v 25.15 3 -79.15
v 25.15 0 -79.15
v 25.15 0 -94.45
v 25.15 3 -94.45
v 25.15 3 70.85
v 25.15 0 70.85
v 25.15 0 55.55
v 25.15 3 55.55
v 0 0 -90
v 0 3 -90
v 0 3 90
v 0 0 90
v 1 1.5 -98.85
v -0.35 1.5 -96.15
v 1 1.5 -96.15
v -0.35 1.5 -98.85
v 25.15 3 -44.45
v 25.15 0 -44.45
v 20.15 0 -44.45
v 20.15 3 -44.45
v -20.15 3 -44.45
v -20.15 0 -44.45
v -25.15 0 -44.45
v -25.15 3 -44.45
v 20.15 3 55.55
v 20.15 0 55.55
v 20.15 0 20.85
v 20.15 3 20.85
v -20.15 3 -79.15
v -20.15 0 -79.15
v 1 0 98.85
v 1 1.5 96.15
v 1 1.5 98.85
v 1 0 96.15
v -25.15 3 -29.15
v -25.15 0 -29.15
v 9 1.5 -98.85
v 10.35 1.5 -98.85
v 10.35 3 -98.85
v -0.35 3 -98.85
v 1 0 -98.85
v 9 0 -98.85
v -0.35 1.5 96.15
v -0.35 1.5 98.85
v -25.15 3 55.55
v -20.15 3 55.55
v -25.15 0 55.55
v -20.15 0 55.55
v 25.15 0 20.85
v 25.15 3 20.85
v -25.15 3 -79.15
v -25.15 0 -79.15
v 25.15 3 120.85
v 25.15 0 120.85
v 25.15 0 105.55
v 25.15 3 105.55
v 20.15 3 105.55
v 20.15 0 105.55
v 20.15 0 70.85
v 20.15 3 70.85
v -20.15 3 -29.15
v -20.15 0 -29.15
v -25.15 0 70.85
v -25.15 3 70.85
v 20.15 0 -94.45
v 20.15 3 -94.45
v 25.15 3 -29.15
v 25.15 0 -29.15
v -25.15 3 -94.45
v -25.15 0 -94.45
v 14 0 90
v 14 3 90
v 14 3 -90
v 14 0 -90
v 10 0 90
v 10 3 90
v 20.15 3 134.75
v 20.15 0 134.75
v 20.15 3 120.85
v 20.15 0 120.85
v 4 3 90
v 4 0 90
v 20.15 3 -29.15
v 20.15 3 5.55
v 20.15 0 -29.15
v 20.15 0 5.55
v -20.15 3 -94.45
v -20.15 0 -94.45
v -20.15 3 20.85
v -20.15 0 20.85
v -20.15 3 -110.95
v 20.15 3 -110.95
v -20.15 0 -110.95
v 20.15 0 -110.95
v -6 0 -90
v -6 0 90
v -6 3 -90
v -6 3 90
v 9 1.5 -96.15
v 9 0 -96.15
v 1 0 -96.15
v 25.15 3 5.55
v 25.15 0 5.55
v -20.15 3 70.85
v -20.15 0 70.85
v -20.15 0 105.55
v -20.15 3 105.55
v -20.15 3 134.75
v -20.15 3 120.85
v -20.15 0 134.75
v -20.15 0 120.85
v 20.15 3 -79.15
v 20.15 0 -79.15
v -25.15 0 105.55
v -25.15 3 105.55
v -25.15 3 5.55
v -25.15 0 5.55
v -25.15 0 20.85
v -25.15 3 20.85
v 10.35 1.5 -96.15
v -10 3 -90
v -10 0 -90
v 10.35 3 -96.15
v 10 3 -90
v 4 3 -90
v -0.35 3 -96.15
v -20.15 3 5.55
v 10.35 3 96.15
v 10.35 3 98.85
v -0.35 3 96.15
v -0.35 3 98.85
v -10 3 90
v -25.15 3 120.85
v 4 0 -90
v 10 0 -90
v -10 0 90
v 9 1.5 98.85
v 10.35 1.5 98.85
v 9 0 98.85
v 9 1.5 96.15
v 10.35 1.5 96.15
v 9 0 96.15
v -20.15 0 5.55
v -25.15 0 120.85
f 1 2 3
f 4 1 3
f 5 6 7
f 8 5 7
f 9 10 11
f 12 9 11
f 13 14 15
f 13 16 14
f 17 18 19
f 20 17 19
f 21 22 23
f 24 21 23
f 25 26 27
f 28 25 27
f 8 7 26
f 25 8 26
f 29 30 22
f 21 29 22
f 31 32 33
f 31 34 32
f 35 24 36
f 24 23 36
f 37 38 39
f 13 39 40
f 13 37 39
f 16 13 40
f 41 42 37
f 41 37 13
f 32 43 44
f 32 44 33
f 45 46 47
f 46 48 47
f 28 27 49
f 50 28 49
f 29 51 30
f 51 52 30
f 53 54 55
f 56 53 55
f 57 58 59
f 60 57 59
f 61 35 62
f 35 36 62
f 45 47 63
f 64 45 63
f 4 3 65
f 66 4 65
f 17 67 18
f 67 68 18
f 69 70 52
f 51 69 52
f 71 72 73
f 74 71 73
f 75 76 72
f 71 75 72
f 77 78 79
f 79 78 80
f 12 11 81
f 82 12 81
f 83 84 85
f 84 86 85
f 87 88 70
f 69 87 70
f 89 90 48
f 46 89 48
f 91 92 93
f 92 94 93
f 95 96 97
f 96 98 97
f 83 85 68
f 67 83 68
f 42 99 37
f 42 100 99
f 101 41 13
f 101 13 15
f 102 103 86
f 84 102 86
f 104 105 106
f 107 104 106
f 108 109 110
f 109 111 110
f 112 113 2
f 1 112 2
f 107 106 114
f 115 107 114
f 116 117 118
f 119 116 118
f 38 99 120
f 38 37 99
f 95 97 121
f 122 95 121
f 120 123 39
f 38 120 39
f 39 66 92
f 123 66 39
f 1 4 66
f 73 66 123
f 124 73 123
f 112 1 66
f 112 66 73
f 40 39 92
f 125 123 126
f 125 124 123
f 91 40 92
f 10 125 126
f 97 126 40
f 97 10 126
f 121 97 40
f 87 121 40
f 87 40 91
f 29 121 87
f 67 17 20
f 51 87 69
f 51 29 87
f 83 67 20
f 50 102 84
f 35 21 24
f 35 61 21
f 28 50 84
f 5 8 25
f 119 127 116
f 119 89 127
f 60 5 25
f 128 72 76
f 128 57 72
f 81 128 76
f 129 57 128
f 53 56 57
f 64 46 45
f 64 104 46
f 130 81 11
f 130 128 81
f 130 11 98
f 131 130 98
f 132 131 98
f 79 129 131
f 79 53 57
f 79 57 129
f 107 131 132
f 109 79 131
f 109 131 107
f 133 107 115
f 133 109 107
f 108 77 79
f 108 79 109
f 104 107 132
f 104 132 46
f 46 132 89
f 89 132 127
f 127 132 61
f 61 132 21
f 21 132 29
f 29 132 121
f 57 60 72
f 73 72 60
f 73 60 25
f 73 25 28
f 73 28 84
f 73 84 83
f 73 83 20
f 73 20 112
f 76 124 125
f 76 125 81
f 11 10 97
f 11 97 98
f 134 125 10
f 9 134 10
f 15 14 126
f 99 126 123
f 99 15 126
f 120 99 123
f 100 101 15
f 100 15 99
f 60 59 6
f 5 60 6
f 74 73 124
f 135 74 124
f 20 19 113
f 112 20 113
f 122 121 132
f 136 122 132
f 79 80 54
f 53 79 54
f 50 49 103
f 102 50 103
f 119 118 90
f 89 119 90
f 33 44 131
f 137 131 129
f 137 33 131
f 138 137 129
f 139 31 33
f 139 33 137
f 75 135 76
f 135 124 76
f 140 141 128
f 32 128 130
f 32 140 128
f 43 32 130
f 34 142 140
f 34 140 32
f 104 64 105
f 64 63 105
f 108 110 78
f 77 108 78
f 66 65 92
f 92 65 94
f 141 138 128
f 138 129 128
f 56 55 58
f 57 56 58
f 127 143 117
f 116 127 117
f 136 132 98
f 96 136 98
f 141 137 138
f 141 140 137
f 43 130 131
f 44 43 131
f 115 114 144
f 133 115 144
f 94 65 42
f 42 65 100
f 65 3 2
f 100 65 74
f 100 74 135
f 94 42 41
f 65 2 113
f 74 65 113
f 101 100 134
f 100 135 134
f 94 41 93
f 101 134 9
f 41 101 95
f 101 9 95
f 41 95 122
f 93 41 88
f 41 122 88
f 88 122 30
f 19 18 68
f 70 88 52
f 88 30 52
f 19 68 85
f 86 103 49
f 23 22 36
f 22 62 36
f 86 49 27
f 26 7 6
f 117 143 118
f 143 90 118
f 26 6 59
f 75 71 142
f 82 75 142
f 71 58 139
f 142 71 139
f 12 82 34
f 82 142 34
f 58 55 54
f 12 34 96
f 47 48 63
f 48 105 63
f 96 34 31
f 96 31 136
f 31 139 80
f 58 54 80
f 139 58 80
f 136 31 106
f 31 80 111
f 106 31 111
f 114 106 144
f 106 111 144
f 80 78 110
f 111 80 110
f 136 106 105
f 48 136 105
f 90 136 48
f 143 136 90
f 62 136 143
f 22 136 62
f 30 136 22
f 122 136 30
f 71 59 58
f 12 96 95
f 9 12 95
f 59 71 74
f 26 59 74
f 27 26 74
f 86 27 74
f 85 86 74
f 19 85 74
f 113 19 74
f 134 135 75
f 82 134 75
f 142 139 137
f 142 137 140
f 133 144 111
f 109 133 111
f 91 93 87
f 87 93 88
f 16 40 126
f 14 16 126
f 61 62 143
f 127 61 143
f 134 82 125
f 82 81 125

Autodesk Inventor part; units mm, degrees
ref_plane "YZ Plane" through (0, 0, 0) normal (1, 0, 0) x (0, 1, 0)
ref_plane "XZ Plane" through (0, 0, 0) normal (0, 1, 0) x (-1, 0, 0)
ref_plane "XY Plane" through (0, 0, 0) normal (0, 0, 1) x (1, 0, 0)
sketch "Sketch1" plane through (0, 0, 0) normal (0, 1, 0) x (-1, 0, 0)
  line L0 (20.15, 134.75) -> (-20.15, 134.75)
  line L1 (-20.15, 134.75) -> (-20.15, -110.95)
  line L2 (-20.15, -110.95) -> (20.15, -110.95)
  line L3 (20.15, -110.95) -> (20.15, 134.75)
  line L4 (20.15, 0) -> (-20.15, 0) construction
  line L5 (0, -110.95) -> (0, 134.75) construction
  point P0 (0, 0)
  point P1 (0, 0)
  dimension "d57" = 40.3
  dimension "d58" = 110.95
  dimension "d59" = 134.75
extrude "Extrusion1" add sketch "Sketch1" along normal blind 3
sketch "Sketch3" plane through (0, 0, 0) normal (0, -1, 0) x (1, 0, 0)
  line L0 (20.15, -110.95) -> (-20.15, -110.95) projected
  line L1 (20.15, 134.75) -> (20.15, -110.95) projected
  line L2 (-20.15, -110.95) -> (-20.15, 134.75) projected
  line L3 (-25.15, -79.15) -> (-20.15, -79.15)
  line L4 (-20.15, -79.15) -> (-20.15, -94.45)
  line L5 (-20.15, -94.45) -> (-25.15, -94.45)
  line L6 (-25.15, -94.45) -> (-25.15, -79.15)
  line L7 (-25.15, -79.15) -> (-20.15, -94.45) construction
  line L8 (-20.15, -79.15) -> (-25.15, -94.45) construction
  line L9 (25.15, -94.45) -> (20.15, -94.45)
  line L10 (20.15, -94.45) -> (20.15, -79.15)
  line L11 (20.15, -79.15) -> (25.15, -79.15)
  line L12 (25.15, -79.15) -> (25.15, -94.45)
  line L13 (25.15, -94.45) -> (20.15, -79.15) construction
  line L14 (20.15, -94.45) -> (25.15, -79.15) construction
  point P0 (0, 0)
  point P1 (-22.65, -86.8)
  point P2 (22.65, -86.8)
  point P3 (20.15, -86.8)
  dimension "d61" = 15.3
  dimension "d64" = 5
  dimension "d65" = 15.3
  dimension "d78" = 24.15
  dimension "d79" = 24.15
  dimension "d97" = 5
extrude "Extrusion3" add sketch "Sketch3" against normal blind 3
pattern_linear "Rectangular Pattern1" count 5 spacing 50 along (0, 0, 1) of "Extrusion3"
sketch "Sketch4" plane through (0, 0, 0) normal (0, -1, 0) x (1, 0, 0)
  line L0 (20.15, -110.95) -> (-20.15, -110.95) projected
  line L1 (1, -96.15) -> (9, -96.15)
  line L2 (9, -96.15) -> (9, -98.85)
  line L3 (9, -98.85) -> (1, -98.85)
  line L4 (1, -98.85) -> (1, -96.15)
  line L5 (1, -96.15) -> (9, -98.85) construction
  line L6 (9, -96.15) -> (1, -98.85) construction
  line L7 (5, -118.696) -> (5, 153.6812) construction
  point P0 (5, -97.5)
  point P1 (5, -97.5)
  point P2 (5, -97.5)
  point P3 (5, -97.5)
  point P4 (0, 0)
  dimension "d69" = 8
  dimension "d70" = 2.7
  dimension "d98" = 13.45
  dimension "d100" = 5
extrude "Extrusion4" cut sketch "Sketch4" against normal blind 3
pattern_linear "Rectangular Pattern2" count 2 spacing 195 along (0, 0, 1) of "Extrusion4"
sketch "Sketch8" plane through (0, 3, 0) normal (0, 1, 0) x (1, 0, 0)
  line L0 (-10, -90) -> (-6, -90)
  line L1 (-6, -90) -> (-6, 90)
  line L2 (-6, 90) -> (-10, 90)
  line L3 (-10, 90) -> (-10, -90)
  line L4 (-10, -90) -> (-6, 90) construction
  line L5 (-6, -90) -> (-10, 90) construction
  point P0 (0, 0)
  point P1 (-8, 0)
  dimension "d82" = 4
  dimension "d83" = 180
  dimension "d84" = 6
extrude "Extrusion5" cut sketch "Sketch8" against normal through all
sketch "Sketch9" plane through (0, 3, 0) normal (0, 1, 0) x (1, 0, 0)
  line L0 (1, 96.15) -> (1, 98.85) projected
  line L1 (1, 98.85) -> (9, 98.85) projected
  line L2 (9, 98.85) -> (9, 96.15) projected
  line L3 (9, 96.15) -> (1, 96.15) projected
  line L4 (-0.35, 96.15) -> (10.35, 96.15)
  line L5 (10.35, 96.15) -> (10.35, 98.85)
  line L6 (10.35, 98.85) -> (-0.35, 98.85)
  line L7 (-0.35, 98.85) -> (-0.35, 96.15)
  line L8 (-0.35, 96.15) -> (10.35, 98.85) construction
  line L9 (10.35, 96.15) -> (-0.35, 98.85) construction
  line L10 (1, 98.85) -> (9, 96.15) construction
  line L11 (9, 96.15) -> (9, 98.85) construction
  line L12 (9, 98.85) -> (1, 96.15) construction
  point P0 (0, 0)
  point P1 (5, 97.5)
  point P2 (5, 97.5)
  dimension "d90" = 10.7
  dimension "d91" = 2.7
extrude "Extrusion6" cut sketch "Sketch9" against normal blind 1.5 contours L4 L7 L6 L0 | L2 L6 L5 L4
pattern_linear "Rectangular Pattern4" count 2 spacing 195 along (0, 0, 1) of "Extrusion6"
pattern_linear "Rectangular Pattern5" count 3 spacing 10 along (1, 0, 0) of "Extrusion5"
equation "\"d79\" = d78"
equation "\"kerf\" = 0.15"
properties part number "Panel3" material "Acrylic, Clear"
